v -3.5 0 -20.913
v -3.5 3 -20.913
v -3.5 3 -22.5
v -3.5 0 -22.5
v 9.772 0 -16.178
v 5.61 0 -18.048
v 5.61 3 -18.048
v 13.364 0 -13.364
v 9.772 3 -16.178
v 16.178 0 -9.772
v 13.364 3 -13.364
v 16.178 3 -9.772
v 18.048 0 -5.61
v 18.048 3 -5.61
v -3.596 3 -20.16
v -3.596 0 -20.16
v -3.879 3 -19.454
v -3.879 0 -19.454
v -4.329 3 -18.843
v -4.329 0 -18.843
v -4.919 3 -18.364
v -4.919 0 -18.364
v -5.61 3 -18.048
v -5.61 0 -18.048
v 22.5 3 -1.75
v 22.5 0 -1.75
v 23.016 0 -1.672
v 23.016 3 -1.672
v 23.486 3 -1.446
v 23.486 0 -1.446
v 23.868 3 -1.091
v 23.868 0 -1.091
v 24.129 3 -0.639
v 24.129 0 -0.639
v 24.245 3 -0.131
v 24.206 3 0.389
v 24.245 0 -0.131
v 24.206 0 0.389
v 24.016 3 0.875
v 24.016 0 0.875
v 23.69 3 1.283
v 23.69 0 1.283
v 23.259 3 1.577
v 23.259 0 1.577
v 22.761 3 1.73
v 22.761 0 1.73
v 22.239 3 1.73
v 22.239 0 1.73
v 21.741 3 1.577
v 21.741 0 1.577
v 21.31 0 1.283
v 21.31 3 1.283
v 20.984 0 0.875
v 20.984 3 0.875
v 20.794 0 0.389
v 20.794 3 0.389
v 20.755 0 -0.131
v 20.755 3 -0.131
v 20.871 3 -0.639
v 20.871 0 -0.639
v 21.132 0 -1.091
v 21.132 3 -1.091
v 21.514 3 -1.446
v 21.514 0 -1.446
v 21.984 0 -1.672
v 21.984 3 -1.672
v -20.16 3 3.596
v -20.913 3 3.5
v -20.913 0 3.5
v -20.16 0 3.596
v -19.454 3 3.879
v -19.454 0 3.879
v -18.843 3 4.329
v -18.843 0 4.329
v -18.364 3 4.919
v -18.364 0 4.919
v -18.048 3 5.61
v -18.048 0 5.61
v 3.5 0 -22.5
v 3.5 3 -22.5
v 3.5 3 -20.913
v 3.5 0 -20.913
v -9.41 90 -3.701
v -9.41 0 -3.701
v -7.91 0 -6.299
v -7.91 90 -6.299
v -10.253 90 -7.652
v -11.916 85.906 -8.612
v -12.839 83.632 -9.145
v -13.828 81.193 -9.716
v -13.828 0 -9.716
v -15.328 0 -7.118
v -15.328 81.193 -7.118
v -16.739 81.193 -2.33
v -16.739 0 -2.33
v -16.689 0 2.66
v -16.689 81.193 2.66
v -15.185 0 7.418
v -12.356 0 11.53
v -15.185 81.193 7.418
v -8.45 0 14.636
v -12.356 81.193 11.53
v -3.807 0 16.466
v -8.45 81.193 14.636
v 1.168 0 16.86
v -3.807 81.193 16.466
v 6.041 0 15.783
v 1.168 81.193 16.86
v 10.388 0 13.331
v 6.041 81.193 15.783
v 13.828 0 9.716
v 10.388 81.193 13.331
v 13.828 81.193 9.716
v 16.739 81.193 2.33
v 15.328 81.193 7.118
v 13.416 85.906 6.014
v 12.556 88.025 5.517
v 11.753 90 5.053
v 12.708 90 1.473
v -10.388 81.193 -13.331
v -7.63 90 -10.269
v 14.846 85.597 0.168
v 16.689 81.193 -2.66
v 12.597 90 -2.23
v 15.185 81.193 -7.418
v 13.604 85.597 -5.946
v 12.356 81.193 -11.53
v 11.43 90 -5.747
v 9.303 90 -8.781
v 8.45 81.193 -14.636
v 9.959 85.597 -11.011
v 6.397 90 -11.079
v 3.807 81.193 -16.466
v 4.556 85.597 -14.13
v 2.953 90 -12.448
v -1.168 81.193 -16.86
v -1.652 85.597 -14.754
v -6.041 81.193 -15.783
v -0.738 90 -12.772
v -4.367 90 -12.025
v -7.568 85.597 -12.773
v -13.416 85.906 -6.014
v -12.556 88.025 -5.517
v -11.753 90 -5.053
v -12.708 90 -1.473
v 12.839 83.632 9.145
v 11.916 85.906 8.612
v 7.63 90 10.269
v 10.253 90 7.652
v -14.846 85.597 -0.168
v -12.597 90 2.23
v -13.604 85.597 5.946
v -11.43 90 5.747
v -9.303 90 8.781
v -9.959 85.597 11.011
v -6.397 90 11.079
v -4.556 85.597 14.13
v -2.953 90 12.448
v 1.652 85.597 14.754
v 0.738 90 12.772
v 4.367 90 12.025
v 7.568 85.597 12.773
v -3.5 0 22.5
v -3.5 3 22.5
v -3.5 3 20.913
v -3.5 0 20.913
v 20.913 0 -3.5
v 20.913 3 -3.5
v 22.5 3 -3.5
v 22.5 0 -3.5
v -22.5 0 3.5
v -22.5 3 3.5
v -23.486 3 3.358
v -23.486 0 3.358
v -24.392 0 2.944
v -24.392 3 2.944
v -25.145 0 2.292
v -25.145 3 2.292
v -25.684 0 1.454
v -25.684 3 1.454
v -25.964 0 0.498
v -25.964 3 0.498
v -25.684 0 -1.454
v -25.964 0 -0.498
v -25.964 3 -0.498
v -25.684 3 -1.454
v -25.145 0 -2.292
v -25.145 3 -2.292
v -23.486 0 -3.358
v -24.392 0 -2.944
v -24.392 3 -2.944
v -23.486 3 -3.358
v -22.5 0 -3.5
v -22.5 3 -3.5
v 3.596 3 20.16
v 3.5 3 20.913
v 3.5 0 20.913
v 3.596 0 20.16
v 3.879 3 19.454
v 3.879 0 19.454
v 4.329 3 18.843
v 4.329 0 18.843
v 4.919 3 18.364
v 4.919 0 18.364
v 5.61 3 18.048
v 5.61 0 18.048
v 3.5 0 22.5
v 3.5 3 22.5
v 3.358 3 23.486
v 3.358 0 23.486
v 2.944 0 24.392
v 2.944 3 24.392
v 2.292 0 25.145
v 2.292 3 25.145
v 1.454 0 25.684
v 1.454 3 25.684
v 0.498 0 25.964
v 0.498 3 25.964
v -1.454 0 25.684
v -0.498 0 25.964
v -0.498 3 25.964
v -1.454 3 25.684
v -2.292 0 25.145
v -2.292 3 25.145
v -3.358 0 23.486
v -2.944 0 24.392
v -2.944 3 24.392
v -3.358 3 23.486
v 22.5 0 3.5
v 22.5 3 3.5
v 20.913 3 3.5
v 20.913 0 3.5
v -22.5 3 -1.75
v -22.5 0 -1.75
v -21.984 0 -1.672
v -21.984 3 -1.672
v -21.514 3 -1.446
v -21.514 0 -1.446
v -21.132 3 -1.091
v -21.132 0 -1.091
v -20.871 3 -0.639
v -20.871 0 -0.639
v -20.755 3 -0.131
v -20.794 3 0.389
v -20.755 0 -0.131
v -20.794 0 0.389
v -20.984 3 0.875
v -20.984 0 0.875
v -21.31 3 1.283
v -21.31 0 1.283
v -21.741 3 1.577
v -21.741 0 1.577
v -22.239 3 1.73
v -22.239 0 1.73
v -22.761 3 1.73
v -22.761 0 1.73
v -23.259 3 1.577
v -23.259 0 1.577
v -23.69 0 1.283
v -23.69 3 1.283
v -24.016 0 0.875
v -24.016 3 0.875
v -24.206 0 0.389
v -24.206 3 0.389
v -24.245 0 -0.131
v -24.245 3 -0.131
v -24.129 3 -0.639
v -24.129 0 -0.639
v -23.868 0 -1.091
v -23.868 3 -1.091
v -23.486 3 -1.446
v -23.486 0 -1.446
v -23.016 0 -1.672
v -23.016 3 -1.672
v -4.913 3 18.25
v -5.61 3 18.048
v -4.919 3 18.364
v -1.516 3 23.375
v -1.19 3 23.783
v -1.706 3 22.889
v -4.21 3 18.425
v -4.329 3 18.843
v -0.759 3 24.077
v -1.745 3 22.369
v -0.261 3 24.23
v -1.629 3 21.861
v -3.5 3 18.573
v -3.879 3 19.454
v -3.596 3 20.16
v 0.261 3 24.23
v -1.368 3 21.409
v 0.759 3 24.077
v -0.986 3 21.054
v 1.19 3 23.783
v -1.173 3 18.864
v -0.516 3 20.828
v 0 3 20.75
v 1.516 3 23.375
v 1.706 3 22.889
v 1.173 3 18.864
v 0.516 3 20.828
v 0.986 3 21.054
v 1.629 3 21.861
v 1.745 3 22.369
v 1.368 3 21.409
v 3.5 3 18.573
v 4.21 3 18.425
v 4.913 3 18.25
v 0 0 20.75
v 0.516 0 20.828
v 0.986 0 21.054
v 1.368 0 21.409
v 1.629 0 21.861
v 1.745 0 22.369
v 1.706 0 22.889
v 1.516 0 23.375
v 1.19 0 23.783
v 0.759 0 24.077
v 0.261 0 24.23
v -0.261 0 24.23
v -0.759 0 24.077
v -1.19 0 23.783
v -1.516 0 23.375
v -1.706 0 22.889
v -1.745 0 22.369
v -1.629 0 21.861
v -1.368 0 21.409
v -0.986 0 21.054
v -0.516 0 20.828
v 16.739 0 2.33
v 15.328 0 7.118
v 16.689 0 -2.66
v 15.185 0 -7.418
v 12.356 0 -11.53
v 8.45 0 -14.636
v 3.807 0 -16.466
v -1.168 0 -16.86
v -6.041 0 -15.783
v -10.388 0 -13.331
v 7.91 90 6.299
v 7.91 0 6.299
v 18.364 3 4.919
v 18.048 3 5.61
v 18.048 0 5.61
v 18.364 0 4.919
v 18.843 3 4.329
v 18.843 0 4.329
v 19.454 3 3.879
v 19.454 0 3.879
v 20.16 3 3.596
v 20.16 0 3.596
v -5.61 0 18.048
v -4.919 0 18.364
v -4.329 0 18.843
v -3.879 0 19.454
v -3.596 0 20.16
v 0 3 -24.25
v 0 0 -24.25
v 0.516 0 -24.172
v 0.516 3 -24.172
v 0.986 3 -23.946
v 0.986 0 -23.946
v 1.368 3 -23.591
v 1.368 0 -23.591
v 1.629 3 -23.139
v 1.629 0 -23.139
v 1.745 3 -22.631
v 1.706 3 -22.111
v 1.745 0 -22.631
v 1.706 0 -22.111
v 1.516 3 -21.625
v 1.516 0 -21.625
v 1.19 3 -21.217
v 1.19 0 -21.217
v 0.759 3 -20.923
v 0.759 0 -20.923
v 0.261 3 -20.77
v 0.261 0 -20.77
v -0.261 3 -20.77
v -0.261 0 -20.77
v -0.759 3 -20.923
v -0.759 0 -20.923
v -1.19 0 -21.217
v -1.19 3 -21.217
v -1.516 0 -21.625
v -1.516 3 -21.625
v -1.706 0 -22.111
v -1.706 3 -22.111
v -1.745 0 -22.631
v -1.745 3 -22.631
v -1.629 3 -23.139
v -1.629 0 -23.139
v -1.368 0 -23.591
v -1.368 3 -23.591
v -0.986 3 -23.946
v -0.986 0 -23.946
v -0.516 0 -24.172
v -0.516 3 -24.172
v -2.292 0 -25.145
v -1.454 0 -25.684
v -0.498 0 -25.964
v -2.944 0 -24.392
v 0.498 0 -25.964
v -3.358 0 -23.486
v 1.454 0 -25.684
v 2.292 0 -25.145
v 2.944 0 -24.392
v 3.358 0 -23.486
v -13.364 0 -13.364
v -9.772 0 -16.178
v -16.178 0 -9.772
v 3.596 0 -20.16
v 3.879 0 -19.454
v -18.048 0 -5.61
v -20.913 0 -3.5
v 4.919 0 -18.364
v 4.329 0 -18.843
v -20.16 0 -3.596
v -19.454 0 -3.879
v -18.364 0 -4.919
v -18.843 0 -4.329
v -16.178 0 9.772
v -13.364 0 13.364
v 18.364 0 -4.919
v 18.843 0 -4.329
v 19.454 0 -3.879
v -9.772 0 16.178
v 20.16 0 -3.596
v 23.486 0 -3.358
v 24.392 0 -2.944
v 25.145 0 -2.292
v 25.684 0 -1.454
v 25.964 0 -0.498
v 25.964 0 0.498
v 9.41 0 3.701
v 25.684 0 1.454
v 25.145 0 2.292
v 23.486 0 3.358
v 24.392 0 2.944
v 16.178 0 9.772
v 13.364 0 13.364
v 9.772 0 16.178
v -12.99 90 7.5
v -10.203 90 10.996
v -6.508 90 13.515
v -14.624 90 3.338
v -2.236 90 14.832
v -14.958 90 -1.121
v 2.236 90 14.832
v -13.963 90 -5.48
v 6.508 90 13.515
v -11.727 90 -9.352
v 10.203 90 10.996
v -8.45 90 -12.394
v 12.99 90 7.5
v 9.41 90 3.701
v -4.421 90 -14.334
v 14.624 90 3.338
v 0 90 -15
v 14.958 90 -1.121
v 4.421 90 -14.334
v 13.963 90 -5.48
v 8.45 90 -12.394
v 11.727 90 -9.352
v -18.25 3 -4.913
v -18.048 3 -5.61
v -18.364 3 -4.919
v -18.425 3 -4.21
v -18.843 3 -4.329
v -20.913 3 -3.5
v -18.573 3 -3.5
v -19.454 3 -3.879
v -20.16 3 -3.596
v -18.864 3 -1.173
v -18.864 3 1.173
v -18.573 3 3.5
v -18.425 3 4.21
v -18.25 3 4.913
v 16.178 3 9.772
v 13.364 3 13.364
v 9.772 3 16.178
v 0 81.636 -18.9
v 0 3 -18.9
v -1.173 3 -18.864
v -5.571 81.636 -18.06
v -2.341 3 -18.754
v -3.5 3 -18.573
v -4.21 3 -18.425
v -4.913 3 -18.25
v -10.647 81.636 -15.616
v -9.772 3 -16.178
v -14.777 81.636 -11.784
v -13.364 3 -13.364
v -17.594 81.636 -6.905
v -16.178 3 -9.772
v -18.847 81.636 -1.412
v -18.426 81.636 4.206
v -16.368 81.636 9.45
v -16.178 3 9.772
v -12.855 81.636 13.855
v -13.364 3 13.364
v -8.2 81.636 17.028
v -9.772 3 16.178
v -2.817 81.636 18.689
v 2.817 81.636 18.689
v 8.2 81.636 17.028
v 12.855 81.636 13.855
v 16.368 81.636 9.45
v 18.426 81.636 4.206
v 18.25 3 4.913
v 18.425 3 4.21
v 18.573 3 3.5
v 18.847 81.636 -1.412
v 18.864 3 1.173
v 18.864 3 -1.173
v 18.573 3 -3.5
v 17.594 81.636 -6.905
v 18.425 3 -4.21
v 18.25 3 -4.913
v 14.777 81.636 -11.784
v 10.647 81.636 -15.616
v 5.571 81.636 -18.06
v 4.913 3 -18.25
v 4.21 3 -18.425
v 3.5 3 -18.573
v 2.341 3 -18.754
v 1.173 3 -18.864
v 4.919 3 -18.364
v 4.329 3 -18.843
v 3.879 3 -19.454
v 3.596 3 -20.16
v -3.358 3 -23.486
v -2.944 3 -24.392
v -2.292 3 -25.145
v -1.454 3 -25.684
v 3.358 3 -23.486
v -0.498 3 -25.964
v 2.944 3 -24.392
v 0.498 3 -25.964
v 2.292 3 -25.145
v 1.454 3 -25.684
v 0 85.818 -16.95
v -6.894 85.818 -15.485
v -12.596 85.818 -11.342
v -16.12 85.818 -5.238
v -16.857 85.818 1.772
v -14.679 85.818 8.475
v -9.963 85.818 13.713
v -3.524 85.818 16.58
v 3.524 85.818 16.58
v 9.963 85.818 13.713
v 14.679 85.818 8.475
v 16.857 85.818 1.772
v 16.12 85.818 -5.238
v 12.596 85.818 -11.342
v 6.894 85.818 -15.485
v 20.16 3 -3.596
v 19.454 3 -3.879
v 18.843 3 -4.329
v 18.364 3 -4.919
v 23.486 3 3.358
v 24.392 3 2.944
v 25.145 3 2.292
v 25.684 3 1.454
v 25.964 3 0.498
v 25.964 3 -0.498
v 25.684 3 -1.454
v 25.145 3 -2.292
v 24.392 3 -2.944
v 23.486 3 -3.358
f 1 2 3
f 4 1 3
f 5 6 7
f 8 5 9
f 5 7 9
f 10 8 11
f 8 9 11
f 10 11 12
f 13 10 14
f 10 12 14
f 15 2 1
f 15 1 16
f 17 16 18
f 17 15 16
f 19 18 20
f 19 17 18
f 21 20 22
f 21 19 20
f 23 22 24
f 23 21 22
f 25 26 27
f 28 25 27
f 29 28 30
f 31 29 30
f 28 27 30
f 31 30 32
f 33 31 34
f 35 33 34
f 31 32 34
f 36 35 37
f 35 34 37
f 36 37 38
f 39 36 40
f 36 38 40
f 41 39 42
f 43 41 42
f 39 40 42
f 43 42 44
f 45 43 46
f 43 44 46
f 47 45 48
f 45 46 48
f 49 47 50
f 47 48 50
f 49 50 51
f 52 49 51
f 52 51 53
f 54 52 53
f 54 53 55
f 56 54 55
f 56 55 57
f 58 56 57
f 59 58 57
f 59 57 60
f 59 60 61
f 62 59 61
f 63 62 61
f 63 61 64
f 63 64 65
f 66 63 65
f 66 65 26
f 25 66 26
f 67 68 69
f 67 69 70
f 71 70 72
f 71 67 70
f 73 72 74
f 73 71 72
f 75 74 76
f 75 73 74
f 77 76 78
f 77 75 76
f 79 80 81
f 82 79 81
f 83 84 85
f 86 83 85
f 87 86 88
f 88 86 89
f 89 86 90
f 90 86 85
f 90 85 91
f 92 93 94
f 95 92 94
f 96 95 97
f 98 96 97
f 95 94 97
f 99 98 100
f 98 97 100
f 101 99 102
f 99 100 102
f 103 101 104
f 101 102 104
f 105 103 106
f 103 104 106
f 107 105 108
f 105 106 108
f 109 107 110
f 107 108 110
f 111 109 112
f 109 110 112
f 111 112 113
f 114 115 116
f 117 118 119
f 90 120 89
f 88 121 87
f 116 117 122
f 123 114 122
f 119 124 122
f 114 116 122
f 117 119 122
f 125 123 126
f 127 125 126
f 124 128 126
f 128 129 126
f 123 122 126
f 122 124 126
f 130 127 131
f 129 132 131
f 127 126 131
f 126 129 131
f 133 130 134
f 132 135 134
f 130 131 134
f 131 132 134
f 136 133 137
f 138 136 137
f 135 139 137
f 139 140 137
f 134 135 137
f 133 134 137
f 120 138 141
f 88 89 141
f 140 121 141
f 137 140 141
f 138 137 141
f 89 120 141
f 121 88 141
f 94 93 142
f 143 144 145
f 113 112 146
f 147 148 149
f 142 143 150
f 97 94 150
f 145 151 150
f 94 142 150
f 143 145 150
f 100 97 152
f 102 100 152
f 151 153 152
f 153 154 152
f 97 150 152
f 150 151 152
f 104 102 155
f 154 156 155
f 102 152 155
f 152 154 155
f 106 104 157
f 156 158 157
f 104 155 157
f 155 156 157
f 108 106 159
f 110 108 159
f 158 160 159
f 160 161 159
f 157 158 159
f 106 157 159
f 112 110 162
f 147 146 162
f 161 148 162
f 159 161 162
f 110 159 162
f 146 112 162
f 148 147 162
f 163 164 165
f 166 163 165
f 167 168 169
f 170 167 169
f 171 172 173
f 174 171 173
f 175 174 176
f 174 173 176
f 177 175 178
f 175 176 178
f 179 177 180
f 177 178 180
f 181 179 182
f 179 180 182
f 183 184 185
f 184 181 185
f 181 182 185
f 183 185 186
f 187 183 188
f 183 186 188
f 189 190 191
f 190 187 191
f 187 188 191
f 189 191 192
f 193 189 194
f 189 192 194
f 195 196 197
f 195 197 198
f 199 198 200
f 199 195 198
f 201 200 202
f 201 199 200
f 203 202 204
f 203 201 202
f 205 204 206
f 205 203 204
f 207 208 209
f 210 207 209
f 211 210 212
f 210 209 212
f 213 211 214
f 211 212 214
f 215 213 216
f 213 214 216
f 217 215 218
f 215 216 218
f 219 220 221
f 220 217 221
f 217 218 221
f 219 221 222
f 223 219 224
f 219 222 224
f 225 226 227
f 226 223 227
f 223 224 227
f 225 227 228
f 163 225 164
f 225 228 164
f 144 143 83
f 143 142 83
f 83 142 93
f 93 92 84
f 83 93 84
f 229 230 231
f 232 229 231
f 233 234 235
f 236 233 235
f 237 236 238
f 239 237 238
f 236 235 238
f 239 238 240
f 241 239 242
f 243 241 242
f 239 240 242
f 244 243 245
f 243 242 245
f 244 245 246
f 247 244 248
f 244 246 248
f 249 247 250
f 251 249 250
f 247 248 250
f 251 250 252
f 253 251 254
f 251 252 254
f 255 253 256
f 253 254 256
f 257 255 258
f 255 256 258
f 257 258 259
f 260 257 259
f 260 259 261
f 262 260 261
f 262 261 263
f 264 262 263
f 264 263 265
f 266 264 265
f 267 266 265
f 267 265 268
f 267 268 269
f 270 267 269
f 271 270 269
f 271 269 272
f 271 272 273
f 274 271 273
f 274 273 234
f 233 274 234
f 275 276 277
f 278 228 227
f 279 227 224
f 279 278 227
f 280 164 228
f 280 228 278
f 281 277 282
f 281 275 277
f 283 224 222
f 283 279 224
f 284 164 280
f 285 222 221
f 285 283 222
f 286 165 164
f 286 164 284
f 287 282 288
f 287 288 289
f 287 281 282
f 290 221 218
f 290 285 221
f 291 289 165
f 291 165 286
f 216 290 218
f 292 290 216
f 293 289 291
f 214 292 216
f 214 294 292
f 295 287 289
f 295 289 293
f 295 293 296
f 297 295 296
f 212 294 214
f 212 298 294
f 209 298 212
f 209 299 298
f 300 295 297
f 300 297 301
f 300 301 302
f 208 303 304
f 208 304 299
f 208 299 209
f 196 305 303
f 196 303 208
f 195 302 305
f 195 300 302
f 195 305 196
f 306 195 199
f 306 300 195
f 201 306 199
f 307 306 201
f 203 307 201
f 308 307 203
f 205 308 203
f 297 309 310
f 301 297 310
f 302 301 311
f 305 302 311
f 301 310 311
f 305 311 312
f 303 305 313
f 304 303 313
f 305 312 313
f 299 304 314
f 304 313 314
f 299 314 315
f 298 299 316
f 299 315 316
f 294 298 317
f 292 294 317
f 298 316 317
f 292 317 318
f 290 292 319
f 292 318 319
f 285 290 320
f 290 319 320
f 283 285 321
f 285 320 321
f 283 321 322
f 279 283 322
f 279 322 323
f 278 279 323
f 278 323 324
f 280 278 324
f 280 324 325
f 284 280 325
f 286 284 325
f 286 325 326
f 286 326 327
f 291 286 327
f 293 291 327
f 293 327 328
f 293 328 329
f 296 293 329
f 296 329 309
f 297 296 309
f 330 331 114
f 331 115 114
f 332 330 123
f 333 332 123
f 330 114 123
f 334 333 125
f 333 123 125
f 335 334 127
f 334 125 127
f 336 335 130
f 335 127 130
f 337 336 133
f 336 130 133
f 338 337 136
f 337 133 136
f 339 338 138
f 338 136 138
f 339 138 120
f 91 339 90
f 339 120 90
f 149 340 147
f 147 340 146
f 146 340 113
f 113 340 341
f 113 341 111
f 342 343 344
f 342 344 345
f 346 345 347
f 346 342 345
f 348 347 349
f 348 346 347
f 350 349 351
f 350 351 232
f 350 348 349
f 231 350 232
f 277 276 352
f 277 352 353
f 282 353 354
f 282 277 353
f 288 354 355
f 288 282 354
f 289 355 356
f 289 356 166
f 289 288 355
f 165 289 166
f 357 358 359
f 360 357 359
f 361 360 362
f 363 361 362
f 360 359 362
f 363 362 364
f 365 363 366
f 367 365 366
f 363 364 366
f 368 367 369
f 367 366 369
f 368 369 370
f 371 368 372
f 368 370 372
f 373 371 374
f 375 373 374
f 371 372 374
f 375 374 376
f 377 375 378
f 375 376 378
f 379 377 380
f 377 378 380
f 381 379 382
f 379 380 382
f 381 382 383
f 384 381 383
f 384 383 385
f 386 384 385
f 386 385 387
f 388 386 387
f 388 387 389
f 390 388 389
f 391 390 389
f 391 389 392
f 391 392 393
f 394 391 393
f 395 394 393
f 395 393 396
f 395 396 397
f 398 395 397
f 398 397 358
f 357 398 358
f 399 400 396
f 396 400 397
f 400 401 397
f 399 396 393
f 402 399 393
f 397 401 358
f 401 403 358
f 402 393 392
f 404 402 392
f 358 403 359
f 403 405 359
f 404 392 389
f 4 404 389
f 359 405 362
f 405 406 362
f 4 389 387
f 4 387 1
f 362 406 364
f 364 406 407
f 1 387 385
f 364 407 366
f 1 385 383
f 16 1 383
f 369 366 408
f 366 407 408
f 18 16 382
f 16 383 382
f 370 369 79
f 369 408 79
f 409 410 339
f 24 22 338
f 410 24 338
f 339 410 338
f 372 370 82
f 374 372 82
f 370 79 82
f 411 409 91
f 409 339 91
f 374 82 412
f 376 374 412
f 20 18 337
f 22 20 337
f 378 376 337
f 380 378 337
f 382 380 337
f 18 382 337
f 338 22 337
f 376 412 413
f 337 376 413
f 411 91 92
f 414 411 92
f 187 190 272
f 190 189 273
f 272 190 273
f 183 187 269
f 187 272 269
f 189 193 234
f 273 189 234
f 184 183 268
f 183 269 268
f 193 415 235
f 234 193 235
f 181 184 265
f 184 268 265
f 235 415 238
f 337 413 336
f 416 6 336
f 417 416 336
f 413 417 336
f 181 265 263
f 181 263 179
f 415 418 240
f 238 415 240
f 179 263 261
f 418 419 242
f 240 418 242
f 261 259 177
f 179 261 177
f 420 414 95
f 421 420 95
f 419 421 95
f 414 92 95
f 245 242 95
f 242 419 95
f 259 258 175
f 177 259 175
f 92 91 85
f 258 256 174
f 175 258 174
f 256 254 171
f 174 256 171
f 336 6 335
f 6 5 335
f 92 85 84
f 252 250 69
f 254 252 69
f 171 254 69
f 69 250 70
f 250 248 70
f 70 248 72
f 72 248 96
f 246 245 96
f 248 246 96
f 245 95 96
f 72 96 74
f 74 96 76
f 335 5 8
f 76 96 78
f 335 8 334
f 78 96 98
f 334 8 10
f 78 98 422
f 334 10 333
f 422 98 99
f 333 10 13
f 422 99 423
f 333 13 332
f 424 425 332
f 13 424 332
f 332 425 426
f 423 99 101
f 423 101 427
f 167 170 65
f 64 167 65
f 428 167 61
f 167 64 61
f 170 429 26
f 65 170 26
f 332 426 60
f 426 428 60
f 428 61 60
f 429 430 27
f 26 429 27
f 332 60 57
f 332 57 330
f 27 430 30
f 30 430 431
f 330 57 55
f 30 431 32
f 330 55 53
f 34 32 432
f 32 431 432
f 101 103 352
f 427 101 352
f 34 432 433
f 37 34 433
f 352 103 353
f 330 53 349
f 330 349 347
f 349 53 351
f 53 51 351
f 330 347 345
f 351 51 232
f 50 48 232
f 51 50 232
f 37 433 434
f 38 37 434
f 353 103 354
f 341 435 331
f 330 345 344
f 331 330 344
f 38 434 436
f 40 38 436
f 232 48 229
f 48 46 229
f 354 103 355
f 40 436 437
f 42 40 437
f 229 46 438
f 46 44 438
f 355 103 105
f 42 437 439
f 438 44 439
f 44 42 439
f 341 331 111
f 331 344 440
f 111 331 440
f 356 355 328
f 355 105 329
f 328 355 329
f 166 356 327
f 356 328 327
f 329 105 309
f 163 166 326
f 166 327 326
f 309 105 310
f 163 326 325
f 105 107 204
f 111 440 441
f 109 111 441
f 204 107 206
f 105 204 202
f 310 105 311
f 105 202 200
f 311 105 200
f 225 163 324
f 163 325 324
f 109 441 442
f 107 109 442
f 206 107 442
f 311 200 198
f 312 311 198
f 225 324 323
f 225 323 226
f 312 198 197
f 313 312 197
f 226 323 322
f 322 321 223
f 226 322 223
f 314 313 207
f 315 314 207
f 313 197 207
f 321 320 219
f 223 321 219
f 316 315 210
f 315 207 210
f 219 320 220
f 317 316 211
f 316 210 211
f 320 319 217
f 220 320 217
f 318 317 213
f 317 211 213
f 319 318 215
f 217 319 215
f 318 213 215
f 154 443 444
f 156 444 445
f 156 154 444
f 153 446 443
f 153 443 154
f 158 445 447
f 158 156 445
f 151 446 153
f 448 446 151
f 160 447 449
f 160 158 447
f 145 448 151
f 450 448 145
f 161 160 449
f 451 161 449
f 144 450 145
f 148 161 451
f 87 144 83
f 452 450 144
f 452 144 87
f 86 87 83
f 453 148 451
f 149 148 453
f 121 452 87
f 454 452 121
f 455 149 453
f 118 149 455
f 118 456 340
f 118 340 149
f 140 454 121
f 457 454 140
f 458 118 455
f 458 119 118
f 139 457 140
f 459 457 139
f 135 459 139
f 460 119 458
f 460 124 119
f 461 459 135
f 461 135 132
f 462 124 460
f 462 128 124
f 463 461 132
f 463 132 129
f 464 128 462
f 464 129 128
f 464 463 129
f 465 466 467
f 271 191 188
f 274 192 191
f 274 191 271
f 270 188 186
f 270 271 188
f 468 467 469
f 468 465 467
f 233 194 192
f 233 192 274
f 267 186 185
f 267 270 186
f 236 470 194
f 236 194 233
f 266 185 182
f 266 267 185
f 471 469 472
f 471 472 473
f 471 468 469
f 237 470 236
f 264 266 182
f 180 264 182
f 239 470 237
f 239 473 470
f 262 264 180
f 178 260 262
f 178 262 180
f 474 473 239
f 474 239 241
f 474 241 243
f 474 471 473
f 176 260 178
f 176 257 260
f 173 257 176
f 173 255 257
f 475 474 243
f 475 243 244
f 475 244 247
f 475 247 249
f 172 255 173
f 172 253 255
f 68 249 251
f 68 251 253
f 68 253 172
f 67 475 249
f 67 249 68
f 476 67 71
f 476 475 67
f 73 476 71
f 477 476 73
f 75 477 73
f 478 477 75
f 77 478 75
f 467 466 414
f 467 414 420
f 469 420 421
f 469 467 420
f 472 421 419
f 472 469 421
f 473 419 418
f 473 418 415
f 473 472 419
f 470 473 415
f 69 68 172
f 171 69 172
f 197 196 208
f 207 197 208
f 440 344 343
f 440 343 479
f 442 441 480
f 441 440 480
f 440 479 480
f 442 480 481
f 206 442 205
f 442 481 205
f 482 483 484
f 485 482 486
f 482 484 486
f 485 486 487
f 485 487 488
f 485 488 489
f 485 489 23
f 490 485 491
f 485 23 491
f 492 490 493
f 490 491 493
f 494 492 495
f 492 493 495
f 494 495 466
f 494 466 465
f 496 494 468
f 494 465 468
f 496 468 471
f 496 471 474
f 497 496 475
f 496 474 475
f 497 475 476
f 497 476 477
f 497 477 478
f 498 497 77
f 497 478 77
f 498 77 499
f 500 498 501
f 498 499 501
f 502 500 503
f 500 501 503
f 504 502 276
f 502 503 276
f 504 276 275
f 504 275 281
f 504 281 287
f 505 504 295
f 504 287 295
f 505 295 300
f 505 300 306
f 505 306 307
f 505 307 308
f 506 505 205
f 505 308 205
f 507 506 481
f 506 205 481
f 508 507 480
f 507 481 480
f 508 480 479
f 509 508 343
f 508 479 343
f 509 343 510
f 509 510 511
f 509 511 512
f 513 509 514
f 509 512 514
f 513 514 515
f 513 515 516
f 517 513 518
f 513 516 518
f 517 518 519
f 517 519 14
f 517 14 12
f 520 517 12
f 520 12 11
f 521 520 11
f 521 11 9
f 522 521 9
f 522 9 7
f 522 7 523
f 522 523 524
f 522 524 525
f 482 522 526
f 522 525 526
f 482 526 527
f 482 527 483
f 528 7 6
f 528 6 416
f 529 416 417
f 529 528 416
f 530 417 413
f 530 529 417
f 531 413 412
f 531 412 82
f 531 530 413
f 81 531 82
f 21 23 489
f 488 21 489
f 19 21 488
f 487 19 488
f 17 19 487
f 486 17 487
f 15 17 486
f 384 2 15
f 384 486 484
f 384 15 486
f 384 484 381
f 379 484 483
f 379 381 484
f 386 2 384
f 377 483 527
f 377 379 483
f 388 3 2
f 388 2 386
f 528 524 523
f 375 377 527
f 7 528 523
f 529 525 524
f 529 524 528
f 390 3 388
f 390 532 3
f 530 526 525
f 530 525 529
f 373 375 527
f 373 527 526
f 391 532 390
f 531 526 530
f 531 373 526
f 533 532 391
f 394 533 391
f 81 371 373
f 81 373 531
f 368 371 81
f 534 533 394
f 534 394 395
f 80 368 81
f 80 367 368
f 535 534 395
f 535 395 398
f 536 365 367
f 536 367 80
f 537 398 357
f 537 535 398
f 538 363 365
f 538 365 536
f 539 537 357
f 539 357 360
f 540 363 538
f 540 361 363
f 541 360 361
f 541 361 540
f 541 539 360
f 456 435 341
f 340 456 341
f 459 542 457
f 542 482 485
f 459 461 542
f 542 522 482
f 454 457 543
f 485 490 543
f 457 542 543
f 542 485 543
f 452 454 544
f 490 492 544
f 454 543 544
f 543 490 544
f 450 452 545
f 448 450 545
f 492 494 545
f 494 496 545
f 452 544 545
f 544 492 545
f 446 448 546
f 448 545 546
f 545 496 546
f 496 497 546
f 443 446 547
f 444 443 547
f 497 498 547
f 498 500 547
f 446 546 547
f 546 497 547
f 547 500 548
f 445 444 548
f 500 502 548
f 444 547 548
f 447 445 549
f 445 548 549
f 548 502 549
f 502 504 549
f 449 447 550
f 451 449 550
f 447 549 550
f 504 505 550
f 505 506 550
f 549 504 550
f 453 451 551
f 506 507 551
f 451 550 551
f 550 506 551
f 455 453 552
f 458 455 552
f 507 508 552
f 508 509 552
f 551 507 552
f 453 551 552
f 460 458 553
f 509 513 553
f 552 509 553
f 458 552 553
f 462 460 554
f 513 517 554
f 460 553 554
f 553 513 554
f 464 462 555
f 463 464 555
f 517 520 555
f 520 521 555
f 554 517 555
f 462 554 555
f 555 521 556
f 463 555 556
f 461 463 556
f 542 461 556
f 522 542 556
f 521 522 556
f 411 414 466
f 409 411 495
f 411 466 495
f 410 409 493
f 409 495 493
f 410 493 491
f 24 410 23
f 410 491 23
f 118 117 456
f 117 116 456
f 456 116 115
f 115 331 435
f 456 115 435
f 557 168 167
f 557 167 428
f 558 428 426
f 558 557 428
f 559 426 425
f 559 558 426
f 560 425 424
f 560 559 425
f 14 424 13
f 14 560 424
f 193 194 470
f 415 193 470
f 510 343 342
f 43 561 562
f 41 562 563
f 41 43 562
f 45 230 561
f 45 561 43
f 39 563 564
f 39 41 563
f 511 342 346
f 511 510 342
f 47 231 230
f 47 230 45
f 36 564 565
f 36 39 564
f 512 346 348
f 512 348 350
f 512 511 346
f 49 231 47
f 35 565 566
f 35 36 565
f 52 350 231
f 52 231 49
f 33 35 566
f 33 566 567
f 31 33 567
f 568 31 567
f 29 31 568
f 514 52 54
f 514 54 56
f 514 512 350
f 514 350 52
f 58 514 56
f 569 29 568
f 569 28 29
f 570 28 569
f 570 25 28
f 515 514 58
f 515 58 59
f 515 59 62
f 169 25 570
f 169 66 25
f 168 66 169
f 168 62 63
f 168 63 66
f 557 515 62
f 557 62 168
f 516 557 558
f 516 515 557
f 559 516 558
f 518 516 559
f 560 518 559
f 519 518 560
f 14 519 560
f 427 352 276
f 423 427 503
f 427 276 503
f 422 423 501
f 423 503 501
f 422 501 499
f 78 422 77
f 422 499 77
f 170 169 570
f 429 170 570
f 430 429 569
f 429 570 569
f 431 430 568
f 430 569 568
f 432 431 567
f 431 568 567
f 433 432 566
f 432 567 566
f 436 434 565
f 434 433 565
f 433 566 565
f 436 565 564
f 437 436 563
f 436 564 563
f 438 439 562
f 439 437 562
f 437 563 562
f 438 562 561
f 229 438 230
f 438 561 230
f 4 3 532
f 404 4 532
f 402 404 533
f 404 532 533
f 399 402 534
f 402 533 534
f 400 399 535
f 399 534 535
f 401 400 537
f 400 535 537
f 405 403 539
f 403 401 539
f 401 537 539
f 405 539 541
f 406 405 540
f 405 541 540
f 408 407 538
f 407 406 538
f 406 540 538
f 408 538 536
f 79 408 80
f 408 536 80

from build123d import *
from build123d.topology import SkipClean

# Parameters (mm, degrees)
SKETCH2_R           = 1.75
CUT_EXTRUDE1_DEPTH  = 10
SKETCH4_R           = 36.837485066
SKETCH4_R_2         = 31.9
CUT_EXTRUDE2_DEPTH  = 99.001122443
FILLET1_R           = 3
BOSS_EXTRUDE1_REACH = 99.221


with BuildPart() as part:
    # Sketch1 → Revolve1 (revolve)
    with BuildSketch(Plane(origin=(0, 0, 0), x_dir=(0, 0, -1), z_dir=(1, 0, 0)), mode=Mode.PRIVATE) as revolve1_sk:
        Polygon((-12.793244162, 90), (-15, 90), (-18.9, 81.63642301), (-18.9, 3), (-31.9, 3), (-31.9, 0), (-17.6, 0), (-16.9, 0), (-16.9, 81.193033685), align=None)
    revolve(revolve1_sk.sketch.rotate(Axis((0, -1110.96911415, 0), (0, 1, 0)), 180), axis=Axis((0, -1110.96911415, 0), (0, 1, 0)))

    # Sketch2 → Cut-Extrude1 (cut)
    with BuildSketch(Plane.XZ):
        with Locations(Location((0, 22.5, 0), (0, 0, 270))):
            Circle(SKETCH2_R)
        with Locations(Location((0, -22.5, 0), (0, 0, 270))):
            Circle(SKETCH2_R)
        with Locations(Location((-22.5, 0, 0), (0, 0, 270))):
            Circle(SKETCH2_R)
        with Locations(Location((22.5, 0, 0), (0, 0, 270))):
            Circle(SKETCH2_R)
    extrude(amount=-CUT_EXTRUDE1_DEPTH, mode=Mode.SUBTRACT)

    # Sketch4 → Cut-Extrude2 (cut, through all)
    # profile 1 of 2: a face of its own
    with SkipClean():  # the faces are left unmerged after this step: merging them gives an invalid solid
        with BuildSketch(Plane(origin=(0, 3, 0), x_dir=(1, 0, 0), z_dir=(0, 1, 0))):
            Circle(SKETCH4_R)
            Circle(SKETCH4_R_2, mode=Mode.SUBTRACT)
        # profile 2 of 2: a face of its own
        with BuildSketch(Plane(origin=(0, 3, 0), x_dir=(1, 0, 0), z_dir=(0, 1, 0))):
            Circle(SKETCH4_R_2)
            with BuildLine():
                Line((-3.5, 18.573098826), (-3.5, 22.5))
                ThreePointArc((-3.5, 22.5), (0, 26), (3.5, 22.5))
                Line((3.5, 22.5), (3.5, 18.573098826))
                ThreePointArc((3.5, 18.573098826), (13.364318164, 13.364318164), (18.573098826, 3.5))
                Line((18.573098826, 3.5), (22.5, 3.5))
                ThreePointArc((22.5, 3.5), (26, 0), (22.5, -3.5))
                Line((22.5, -3.5), (18.573098826, -3.5))
                ThreePointArc((18.573098826, -3.5), (13.364318164, -13.364318164), (3.5, -18.573098826))
                Line((3.5, -18.573098826), (3.5, -22.5))
                ThreePointArc((3.5, -22.5), (0, -26), (-3.5, -22.5))
                Line((-3.5, -22.5), (-3.5, -18.573098826))
                ThreePointArc((-3.5, -18.573098826), (-13.364318164, -13.364318164), (-18.573098826, -3.5))
                Line((-18.573098826, -3.5), (-22.5, -3.5))
                ThreePointArc((-22.5, -3.5), (-26, 0), (-22.5, 3.5))
                Line((-22.5, 3.5), (-18.573098826, 3.5))
                ThreePointArc((-18.573098826, 3.5), (-13.364318164, 13.364318164), (-3.5, 18.573098826))
            make_face(mode=Mode.SUBTRACT)
        extrude(amount=-CUT_EXTRUDE2_DEPTH, mode=Mode.SUBTRACT)

    # Fillet1
    # the kernel refuses this fillet: 3 mm, written as the material it adds along each edge
    with BuildSketch(Plane(origin=(-3.5, 3, -18.573098826), x_dir=(-0.9704272072576611, 0, 0.24139394237241404), z_dir=(0, -1, 0)), Plane(origin=(-18.573098826, 3, 3.5), x_dir=(0.24139394237237982, -3.328806956187132e-15, 0.9704272072576697), z_dir=(0, -1, 0)), Plane(origin=(3.5, 3, 18.573098826), x_dir=(0.970427207257667, 0, -0.24139394237239048), z_dir=(0, -1, 0)), Plane(origin=(18.573098826, 3, -3.5), x_dir=(-0.24139394237243622, 3.3288069561870833e-15, -0.9704272072576556), z_dir=(0, -1, 0))) as fillet1_piece_1:
        with BuildLine():
            CenterArc((2.346406537, 2.995034797), FILLET1_R, 193.968826574, 72.734276137)
            Line((-0.564875085, 2.27085297), (0, 0))
            ThreePointArc((0, 0), (1.086938322, 0.031280778), (2.173876645, 0))
        make_face()
    extrude(amount=3)
    with BuildSketch(Plane(origin=(-18.573098826, 3, -3.5), x_dir=(0.24139394237239928, 3.3288069561871153e-15, -0.9704272072576648), z_dir=(0, -1, 0)), Plane(origin=(-3.5, 3, 18.573098826), x_dir=(-0.9704272072576595, 0, -0.24139394237242057), z_dir=(0, -1, 0)), Plane(origin=(18.573098826, 3, 3.5), x_dir=(-0.24139394237244305, -3.328806956187078e-15, 0.970427207257654), z_dir=(0, -1, 0)), Plane(origin=(3.5, 3, -18.573098826), x_dir=(0.9704272072576657, 0, 0.2413939423723955), z_dir=(0, -1, 0))) as fillet1_piece_2:
        with BuildLine():
            CenterArc((2.346406537, -2.995034797), FILLET1_R, 93.296897289, 72.734276137)
            Line((-0.564875085, -2.27085297), (0, 0))
            ThreePointArc((0, 0), (1.086938322, -0.031280778), (2.173876645, 0))
        make_face()
    extrude(amount=3)

    # Boss-Extrude1: up to this cone (the profile starts inside it)
    boss_extrude1_end = Plane(origin=(0, 0, 0), z_dir=(0, -1, 0)).offset(-117.435199641) * Cone(1e-06, 126.797041985, 271.917133037, align=(Align.CENTER, Align.CENTER, Align.MIN), mode=Mode.PRIVATE)
    # Sketch5 → Boss-Extrude1 (add, up to the surface)
    with BuildSketch(Plane.XZ, mode=Mode.PRIVATE) as boss_extrude1_sk1:
        Polygon((14.838457268, 10.299038106), (16.338457268, 7.700961894), (9.410254038, 3.700961894), (7.910254038, 6.299038106), align=None)
    boss_extrude1_tool1 = extrude(boss_extrude1_sk1.sketch, amount=-BOSS_EXTRUDE1_REACH, mode=Mode.PRIVATE) & boss_extrude1_end
    add(boss_extrude1_tool1.solids().sort_by_distance((12.124356, 0, 7))[0])
    # Sketch5 → Boss-Extrude1 (add, up to the surface)
    with BuildSketch(Plane.XZ, mode=Mode.PRIVATE) as boss_extrude1_sk2:
        Polygon((-14.838457268, -10.299038106), (-16.338457268, -7.700961894), (-9.410254038, -3.700961894), (-7.910254038, -6.299038106), align=None)
    boss_extrude1_tool2 = extrude(boss_extrude1_sk2.sketch, amount=-BOSS_EXTRUDE1_REACH, mode=Mode.PRIVATE) & boss_extrude1_end
    add(boss_extrude1_tool2.solids().sort_by_distance((-12.124356, 0, -7))[0])

    # SurfaceCut2
    split(bisect_by=Plane(origin=(0, 90, 0), x_dir=(1, 0, 0), z_dir=(0, 1, 0)), keep=Keep.BOTTOM)


solid = part.part
